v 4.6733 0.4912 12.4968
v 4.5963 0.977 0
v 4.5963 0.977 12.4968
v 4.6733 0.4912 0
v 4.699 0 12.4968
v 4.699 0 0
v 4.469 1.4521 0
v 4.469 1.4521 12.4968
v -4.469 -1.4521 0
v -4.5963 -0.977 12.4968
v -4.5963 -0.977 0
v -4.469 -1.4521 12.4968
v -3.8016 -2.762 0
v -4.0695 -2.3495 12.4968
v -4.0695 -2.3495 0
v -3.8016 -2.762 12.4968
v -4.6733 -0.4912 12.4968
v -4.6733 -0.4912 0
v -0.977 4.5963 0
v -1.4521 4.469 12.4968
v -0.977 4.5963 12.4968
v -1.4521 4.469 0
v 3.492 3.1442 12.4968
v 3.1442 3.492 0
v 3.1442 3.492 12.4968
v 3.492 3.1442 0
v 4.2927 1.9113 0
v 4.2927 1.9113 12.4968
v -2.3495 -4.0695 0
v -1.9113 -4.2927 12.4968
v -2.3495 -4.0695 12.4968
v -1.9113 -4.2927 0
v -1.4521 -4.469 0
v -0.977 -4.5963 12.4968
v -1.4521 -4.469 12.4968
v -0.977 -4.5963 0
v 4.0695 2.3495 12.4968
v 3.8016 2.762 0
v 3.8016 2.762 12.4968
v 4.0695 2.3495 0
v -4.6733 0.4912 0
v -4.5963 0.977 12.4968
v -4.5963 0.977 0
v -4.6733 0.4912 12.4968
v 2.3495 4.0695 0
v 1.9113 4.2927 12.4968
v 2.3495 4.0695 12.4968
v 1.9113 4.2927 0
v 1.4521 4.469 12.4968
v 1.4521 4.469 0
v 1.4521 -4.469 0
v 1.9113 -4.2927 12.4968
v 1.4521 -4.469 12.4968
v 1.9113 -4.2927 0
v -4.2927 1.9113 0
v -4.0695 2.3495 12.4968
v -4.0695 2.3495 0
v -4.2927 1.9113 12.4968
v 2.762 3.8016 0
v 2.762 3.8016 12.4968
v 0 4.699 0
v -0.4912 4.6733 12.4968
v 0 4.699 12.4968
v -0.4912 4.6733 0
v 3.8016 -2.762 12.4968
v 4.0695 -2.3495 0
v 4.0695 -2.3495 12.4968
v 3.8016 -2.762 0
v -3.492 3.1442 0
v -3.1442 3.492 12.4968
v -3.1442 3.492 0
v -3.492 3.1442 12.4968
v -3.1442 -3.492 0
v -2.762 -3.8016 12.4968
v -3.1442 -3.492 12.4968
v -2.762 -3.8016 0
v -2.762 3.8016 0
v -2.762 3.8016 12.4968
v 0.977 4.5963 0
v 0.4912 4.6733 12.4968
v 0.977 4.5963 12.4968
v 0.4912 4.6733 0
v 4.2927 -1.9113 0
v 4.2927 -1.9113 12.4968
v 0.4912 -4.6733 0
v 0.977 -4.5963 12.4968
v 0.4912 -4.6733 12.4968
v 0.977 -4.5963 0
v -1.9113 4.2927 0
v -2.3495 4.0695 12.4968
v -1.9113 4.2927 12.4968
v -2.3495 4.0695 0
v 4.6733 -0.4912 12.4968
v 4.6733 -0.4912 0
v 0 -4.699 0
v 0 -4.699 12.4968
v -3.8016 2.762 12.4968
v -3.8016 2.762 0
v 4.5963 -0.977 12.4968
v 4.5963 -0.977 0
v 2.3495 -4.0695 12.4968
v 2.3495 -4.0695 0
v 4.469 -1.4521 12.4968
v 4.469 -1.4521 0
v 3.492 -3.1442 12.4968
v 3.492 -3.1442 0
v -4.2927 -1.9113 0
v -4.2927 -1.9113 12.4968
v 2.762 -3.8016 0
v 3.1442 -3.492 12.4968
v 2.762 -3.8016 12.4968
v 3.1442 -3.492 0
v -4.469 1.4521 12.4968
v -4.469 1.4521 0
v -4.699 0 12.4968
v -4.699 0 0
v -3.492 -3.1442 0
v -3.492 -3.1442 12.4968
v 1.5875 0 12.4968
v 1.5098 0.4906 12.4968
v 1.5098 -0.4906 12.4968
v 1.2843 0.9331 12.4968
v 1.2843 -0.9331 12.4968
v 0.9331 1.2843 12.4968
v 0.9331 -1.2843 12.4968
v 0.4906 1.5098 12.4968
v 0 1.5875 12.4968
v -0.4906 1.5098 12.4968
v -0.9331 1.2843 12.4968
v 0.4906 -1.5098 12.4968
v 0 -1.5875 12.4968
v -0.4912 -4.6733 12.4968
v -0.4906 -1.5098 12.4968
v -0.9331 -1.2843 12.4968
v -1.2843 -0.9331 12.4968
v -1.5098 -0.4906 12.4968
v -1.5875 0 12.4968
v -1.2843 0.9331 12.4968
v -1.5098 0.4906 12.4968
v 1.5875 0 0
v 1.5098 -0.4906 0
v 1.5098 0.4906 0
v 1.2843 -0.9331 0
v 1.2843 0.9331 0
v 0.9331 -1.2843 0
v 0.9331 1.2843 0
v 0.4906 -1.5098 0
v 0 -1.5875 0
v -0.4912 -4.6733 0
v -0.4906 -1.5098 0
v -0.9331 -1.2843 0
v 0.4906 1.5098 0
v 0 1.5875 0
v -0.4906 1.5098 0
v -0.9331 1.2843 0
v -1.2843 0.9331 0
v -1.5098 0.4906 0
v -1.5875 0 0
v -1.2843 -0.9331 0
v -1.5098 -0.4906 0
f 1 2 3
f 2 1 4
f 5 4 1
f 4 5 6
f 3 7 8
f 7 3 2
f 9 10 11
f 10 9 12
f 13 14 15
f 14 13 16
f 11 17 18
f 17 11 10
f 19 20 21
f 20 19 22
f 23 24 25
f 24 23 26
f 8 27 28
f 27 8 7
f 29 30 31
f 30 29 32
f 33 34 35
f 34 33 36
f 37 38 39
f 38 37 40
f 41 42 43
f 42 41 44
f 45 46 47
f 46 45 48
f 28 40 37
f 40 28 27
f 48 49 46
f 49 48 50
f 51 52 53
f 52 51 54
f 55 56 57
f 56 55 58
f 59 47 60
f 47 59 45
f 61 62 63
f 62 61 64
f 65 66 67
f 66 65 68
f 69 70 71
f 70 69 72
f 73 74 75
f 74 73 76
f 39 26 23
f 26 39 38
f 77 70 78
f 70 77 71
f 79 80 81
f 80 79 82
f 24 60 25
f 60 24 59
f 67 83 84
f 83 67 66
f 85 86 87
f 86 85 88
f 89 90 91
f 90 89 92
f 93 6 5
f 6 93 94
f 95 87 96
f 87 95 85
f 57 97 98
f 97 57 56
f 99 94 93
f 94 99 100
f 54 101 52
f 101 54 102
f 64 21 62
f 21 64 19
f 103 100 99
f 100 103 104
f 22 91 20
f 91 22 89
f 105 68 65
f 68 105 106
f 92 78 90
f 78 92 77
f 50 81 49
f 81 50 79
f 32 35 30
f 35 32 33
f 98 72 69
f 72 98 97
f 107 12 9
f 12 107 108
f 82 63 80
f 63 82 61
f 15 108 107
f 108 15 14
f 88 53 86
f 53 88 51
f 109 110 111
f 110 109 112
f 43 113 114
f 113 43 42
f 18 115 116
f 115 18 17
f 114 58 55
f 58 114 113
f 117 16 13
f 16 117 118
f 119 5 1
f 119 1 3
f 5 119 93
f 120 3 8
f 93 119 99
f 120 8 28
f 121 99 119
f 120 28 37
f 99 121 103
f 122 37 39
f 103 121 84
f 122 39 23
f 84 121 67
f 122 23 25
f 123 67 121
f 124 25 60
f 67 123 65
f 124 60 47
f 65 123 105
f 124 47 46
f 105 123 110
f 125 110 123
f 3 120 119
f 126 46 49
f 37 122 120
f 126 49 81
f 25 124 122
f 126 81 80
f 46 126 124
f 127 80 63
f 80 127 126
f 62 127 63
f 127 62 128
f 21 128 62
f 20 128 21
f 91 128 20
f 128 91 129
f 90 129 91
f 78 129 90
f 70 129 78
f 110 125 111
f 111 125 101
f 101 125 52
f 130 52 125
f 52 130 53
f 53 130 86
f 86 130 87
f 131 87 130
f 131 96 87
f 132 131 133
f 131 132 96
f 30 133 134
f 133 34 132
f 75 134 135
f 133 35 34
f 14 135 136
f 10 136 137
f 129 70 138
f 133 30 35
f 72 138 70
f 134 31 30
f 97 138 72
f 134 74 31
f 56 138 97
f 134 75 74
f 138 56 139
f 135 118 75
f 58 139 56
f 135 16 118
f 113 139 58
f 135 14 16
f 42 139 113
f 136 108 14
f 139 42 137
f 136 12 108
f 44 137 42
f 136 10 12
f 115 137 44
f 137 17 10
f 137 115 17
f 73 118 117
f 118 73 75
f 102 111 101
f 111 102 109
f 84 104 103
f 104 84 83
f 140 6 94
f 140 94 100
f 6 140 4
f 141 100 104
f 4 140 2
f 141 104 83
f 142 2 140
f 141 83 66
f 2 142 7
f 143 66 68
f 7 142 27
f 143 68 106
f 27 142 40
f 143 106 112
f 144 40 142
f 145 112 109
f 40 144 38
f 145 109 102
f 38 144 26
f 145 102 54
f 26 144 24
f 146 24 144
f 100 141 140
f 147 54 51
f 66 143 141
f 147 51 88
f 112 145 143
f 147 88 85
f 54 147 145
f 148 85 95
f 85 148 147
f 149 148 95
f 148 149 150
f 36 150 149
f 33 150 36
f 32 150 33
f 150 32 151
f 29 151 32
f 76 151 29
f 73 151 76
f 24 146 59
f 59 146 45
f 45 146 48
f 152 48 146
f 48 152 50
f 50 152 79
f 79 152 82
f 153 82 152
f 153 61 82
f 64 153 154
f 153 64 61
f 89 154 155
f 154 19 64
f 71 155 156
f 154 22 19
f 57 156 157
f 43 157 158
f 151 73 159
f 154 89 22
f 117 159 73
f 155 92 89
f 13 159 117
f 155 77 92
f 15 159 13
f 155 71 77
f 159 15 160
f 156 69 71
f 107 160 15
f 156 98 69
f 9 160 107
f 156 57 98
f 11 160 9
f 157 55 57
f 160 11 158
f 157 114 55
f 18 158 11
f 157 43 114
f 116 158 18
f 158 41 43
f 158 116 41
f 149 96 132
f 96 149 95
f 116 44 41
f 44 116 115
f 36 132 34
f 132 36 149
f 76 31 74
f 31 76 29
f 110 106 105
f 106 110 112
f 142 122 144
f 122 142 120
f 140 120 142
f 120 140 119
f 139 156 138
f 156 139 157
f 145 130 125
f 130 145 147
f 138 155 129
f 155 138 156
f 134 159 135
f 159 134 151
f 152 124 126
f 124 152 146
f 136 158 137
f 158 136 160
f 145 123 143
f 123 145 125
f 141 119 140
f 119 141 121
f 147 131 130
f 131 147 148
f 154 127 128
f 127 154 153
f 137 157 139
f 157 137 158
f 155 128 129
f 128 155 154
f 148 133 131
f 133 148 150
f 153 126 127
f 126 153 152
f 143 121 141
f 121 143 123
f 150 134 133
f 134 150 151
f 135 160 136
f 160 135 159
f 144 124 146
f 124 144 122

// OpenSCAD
//
// Part #564 Insulating Spacer
//
// After printing, tap with 5/32 BSW tap. Yes, the threads
// could be printed, but wouldn't be nearly as accurate as
// doing it with a tap.
//
// v1.0 WH May 28 2018
//
$fa=1.0;
$fs=0.5;
inch=25.4;
eps=0.05;

height=0.492*inch;
outer_r=0.370/2*inch;
hole_r=0.125/2*inch;

difference() {
  cylinder(h=height,r=outer_r);
  translate([0,0,-eps])
    cylinder(h=height+2*eps,r=hole_r);
}
